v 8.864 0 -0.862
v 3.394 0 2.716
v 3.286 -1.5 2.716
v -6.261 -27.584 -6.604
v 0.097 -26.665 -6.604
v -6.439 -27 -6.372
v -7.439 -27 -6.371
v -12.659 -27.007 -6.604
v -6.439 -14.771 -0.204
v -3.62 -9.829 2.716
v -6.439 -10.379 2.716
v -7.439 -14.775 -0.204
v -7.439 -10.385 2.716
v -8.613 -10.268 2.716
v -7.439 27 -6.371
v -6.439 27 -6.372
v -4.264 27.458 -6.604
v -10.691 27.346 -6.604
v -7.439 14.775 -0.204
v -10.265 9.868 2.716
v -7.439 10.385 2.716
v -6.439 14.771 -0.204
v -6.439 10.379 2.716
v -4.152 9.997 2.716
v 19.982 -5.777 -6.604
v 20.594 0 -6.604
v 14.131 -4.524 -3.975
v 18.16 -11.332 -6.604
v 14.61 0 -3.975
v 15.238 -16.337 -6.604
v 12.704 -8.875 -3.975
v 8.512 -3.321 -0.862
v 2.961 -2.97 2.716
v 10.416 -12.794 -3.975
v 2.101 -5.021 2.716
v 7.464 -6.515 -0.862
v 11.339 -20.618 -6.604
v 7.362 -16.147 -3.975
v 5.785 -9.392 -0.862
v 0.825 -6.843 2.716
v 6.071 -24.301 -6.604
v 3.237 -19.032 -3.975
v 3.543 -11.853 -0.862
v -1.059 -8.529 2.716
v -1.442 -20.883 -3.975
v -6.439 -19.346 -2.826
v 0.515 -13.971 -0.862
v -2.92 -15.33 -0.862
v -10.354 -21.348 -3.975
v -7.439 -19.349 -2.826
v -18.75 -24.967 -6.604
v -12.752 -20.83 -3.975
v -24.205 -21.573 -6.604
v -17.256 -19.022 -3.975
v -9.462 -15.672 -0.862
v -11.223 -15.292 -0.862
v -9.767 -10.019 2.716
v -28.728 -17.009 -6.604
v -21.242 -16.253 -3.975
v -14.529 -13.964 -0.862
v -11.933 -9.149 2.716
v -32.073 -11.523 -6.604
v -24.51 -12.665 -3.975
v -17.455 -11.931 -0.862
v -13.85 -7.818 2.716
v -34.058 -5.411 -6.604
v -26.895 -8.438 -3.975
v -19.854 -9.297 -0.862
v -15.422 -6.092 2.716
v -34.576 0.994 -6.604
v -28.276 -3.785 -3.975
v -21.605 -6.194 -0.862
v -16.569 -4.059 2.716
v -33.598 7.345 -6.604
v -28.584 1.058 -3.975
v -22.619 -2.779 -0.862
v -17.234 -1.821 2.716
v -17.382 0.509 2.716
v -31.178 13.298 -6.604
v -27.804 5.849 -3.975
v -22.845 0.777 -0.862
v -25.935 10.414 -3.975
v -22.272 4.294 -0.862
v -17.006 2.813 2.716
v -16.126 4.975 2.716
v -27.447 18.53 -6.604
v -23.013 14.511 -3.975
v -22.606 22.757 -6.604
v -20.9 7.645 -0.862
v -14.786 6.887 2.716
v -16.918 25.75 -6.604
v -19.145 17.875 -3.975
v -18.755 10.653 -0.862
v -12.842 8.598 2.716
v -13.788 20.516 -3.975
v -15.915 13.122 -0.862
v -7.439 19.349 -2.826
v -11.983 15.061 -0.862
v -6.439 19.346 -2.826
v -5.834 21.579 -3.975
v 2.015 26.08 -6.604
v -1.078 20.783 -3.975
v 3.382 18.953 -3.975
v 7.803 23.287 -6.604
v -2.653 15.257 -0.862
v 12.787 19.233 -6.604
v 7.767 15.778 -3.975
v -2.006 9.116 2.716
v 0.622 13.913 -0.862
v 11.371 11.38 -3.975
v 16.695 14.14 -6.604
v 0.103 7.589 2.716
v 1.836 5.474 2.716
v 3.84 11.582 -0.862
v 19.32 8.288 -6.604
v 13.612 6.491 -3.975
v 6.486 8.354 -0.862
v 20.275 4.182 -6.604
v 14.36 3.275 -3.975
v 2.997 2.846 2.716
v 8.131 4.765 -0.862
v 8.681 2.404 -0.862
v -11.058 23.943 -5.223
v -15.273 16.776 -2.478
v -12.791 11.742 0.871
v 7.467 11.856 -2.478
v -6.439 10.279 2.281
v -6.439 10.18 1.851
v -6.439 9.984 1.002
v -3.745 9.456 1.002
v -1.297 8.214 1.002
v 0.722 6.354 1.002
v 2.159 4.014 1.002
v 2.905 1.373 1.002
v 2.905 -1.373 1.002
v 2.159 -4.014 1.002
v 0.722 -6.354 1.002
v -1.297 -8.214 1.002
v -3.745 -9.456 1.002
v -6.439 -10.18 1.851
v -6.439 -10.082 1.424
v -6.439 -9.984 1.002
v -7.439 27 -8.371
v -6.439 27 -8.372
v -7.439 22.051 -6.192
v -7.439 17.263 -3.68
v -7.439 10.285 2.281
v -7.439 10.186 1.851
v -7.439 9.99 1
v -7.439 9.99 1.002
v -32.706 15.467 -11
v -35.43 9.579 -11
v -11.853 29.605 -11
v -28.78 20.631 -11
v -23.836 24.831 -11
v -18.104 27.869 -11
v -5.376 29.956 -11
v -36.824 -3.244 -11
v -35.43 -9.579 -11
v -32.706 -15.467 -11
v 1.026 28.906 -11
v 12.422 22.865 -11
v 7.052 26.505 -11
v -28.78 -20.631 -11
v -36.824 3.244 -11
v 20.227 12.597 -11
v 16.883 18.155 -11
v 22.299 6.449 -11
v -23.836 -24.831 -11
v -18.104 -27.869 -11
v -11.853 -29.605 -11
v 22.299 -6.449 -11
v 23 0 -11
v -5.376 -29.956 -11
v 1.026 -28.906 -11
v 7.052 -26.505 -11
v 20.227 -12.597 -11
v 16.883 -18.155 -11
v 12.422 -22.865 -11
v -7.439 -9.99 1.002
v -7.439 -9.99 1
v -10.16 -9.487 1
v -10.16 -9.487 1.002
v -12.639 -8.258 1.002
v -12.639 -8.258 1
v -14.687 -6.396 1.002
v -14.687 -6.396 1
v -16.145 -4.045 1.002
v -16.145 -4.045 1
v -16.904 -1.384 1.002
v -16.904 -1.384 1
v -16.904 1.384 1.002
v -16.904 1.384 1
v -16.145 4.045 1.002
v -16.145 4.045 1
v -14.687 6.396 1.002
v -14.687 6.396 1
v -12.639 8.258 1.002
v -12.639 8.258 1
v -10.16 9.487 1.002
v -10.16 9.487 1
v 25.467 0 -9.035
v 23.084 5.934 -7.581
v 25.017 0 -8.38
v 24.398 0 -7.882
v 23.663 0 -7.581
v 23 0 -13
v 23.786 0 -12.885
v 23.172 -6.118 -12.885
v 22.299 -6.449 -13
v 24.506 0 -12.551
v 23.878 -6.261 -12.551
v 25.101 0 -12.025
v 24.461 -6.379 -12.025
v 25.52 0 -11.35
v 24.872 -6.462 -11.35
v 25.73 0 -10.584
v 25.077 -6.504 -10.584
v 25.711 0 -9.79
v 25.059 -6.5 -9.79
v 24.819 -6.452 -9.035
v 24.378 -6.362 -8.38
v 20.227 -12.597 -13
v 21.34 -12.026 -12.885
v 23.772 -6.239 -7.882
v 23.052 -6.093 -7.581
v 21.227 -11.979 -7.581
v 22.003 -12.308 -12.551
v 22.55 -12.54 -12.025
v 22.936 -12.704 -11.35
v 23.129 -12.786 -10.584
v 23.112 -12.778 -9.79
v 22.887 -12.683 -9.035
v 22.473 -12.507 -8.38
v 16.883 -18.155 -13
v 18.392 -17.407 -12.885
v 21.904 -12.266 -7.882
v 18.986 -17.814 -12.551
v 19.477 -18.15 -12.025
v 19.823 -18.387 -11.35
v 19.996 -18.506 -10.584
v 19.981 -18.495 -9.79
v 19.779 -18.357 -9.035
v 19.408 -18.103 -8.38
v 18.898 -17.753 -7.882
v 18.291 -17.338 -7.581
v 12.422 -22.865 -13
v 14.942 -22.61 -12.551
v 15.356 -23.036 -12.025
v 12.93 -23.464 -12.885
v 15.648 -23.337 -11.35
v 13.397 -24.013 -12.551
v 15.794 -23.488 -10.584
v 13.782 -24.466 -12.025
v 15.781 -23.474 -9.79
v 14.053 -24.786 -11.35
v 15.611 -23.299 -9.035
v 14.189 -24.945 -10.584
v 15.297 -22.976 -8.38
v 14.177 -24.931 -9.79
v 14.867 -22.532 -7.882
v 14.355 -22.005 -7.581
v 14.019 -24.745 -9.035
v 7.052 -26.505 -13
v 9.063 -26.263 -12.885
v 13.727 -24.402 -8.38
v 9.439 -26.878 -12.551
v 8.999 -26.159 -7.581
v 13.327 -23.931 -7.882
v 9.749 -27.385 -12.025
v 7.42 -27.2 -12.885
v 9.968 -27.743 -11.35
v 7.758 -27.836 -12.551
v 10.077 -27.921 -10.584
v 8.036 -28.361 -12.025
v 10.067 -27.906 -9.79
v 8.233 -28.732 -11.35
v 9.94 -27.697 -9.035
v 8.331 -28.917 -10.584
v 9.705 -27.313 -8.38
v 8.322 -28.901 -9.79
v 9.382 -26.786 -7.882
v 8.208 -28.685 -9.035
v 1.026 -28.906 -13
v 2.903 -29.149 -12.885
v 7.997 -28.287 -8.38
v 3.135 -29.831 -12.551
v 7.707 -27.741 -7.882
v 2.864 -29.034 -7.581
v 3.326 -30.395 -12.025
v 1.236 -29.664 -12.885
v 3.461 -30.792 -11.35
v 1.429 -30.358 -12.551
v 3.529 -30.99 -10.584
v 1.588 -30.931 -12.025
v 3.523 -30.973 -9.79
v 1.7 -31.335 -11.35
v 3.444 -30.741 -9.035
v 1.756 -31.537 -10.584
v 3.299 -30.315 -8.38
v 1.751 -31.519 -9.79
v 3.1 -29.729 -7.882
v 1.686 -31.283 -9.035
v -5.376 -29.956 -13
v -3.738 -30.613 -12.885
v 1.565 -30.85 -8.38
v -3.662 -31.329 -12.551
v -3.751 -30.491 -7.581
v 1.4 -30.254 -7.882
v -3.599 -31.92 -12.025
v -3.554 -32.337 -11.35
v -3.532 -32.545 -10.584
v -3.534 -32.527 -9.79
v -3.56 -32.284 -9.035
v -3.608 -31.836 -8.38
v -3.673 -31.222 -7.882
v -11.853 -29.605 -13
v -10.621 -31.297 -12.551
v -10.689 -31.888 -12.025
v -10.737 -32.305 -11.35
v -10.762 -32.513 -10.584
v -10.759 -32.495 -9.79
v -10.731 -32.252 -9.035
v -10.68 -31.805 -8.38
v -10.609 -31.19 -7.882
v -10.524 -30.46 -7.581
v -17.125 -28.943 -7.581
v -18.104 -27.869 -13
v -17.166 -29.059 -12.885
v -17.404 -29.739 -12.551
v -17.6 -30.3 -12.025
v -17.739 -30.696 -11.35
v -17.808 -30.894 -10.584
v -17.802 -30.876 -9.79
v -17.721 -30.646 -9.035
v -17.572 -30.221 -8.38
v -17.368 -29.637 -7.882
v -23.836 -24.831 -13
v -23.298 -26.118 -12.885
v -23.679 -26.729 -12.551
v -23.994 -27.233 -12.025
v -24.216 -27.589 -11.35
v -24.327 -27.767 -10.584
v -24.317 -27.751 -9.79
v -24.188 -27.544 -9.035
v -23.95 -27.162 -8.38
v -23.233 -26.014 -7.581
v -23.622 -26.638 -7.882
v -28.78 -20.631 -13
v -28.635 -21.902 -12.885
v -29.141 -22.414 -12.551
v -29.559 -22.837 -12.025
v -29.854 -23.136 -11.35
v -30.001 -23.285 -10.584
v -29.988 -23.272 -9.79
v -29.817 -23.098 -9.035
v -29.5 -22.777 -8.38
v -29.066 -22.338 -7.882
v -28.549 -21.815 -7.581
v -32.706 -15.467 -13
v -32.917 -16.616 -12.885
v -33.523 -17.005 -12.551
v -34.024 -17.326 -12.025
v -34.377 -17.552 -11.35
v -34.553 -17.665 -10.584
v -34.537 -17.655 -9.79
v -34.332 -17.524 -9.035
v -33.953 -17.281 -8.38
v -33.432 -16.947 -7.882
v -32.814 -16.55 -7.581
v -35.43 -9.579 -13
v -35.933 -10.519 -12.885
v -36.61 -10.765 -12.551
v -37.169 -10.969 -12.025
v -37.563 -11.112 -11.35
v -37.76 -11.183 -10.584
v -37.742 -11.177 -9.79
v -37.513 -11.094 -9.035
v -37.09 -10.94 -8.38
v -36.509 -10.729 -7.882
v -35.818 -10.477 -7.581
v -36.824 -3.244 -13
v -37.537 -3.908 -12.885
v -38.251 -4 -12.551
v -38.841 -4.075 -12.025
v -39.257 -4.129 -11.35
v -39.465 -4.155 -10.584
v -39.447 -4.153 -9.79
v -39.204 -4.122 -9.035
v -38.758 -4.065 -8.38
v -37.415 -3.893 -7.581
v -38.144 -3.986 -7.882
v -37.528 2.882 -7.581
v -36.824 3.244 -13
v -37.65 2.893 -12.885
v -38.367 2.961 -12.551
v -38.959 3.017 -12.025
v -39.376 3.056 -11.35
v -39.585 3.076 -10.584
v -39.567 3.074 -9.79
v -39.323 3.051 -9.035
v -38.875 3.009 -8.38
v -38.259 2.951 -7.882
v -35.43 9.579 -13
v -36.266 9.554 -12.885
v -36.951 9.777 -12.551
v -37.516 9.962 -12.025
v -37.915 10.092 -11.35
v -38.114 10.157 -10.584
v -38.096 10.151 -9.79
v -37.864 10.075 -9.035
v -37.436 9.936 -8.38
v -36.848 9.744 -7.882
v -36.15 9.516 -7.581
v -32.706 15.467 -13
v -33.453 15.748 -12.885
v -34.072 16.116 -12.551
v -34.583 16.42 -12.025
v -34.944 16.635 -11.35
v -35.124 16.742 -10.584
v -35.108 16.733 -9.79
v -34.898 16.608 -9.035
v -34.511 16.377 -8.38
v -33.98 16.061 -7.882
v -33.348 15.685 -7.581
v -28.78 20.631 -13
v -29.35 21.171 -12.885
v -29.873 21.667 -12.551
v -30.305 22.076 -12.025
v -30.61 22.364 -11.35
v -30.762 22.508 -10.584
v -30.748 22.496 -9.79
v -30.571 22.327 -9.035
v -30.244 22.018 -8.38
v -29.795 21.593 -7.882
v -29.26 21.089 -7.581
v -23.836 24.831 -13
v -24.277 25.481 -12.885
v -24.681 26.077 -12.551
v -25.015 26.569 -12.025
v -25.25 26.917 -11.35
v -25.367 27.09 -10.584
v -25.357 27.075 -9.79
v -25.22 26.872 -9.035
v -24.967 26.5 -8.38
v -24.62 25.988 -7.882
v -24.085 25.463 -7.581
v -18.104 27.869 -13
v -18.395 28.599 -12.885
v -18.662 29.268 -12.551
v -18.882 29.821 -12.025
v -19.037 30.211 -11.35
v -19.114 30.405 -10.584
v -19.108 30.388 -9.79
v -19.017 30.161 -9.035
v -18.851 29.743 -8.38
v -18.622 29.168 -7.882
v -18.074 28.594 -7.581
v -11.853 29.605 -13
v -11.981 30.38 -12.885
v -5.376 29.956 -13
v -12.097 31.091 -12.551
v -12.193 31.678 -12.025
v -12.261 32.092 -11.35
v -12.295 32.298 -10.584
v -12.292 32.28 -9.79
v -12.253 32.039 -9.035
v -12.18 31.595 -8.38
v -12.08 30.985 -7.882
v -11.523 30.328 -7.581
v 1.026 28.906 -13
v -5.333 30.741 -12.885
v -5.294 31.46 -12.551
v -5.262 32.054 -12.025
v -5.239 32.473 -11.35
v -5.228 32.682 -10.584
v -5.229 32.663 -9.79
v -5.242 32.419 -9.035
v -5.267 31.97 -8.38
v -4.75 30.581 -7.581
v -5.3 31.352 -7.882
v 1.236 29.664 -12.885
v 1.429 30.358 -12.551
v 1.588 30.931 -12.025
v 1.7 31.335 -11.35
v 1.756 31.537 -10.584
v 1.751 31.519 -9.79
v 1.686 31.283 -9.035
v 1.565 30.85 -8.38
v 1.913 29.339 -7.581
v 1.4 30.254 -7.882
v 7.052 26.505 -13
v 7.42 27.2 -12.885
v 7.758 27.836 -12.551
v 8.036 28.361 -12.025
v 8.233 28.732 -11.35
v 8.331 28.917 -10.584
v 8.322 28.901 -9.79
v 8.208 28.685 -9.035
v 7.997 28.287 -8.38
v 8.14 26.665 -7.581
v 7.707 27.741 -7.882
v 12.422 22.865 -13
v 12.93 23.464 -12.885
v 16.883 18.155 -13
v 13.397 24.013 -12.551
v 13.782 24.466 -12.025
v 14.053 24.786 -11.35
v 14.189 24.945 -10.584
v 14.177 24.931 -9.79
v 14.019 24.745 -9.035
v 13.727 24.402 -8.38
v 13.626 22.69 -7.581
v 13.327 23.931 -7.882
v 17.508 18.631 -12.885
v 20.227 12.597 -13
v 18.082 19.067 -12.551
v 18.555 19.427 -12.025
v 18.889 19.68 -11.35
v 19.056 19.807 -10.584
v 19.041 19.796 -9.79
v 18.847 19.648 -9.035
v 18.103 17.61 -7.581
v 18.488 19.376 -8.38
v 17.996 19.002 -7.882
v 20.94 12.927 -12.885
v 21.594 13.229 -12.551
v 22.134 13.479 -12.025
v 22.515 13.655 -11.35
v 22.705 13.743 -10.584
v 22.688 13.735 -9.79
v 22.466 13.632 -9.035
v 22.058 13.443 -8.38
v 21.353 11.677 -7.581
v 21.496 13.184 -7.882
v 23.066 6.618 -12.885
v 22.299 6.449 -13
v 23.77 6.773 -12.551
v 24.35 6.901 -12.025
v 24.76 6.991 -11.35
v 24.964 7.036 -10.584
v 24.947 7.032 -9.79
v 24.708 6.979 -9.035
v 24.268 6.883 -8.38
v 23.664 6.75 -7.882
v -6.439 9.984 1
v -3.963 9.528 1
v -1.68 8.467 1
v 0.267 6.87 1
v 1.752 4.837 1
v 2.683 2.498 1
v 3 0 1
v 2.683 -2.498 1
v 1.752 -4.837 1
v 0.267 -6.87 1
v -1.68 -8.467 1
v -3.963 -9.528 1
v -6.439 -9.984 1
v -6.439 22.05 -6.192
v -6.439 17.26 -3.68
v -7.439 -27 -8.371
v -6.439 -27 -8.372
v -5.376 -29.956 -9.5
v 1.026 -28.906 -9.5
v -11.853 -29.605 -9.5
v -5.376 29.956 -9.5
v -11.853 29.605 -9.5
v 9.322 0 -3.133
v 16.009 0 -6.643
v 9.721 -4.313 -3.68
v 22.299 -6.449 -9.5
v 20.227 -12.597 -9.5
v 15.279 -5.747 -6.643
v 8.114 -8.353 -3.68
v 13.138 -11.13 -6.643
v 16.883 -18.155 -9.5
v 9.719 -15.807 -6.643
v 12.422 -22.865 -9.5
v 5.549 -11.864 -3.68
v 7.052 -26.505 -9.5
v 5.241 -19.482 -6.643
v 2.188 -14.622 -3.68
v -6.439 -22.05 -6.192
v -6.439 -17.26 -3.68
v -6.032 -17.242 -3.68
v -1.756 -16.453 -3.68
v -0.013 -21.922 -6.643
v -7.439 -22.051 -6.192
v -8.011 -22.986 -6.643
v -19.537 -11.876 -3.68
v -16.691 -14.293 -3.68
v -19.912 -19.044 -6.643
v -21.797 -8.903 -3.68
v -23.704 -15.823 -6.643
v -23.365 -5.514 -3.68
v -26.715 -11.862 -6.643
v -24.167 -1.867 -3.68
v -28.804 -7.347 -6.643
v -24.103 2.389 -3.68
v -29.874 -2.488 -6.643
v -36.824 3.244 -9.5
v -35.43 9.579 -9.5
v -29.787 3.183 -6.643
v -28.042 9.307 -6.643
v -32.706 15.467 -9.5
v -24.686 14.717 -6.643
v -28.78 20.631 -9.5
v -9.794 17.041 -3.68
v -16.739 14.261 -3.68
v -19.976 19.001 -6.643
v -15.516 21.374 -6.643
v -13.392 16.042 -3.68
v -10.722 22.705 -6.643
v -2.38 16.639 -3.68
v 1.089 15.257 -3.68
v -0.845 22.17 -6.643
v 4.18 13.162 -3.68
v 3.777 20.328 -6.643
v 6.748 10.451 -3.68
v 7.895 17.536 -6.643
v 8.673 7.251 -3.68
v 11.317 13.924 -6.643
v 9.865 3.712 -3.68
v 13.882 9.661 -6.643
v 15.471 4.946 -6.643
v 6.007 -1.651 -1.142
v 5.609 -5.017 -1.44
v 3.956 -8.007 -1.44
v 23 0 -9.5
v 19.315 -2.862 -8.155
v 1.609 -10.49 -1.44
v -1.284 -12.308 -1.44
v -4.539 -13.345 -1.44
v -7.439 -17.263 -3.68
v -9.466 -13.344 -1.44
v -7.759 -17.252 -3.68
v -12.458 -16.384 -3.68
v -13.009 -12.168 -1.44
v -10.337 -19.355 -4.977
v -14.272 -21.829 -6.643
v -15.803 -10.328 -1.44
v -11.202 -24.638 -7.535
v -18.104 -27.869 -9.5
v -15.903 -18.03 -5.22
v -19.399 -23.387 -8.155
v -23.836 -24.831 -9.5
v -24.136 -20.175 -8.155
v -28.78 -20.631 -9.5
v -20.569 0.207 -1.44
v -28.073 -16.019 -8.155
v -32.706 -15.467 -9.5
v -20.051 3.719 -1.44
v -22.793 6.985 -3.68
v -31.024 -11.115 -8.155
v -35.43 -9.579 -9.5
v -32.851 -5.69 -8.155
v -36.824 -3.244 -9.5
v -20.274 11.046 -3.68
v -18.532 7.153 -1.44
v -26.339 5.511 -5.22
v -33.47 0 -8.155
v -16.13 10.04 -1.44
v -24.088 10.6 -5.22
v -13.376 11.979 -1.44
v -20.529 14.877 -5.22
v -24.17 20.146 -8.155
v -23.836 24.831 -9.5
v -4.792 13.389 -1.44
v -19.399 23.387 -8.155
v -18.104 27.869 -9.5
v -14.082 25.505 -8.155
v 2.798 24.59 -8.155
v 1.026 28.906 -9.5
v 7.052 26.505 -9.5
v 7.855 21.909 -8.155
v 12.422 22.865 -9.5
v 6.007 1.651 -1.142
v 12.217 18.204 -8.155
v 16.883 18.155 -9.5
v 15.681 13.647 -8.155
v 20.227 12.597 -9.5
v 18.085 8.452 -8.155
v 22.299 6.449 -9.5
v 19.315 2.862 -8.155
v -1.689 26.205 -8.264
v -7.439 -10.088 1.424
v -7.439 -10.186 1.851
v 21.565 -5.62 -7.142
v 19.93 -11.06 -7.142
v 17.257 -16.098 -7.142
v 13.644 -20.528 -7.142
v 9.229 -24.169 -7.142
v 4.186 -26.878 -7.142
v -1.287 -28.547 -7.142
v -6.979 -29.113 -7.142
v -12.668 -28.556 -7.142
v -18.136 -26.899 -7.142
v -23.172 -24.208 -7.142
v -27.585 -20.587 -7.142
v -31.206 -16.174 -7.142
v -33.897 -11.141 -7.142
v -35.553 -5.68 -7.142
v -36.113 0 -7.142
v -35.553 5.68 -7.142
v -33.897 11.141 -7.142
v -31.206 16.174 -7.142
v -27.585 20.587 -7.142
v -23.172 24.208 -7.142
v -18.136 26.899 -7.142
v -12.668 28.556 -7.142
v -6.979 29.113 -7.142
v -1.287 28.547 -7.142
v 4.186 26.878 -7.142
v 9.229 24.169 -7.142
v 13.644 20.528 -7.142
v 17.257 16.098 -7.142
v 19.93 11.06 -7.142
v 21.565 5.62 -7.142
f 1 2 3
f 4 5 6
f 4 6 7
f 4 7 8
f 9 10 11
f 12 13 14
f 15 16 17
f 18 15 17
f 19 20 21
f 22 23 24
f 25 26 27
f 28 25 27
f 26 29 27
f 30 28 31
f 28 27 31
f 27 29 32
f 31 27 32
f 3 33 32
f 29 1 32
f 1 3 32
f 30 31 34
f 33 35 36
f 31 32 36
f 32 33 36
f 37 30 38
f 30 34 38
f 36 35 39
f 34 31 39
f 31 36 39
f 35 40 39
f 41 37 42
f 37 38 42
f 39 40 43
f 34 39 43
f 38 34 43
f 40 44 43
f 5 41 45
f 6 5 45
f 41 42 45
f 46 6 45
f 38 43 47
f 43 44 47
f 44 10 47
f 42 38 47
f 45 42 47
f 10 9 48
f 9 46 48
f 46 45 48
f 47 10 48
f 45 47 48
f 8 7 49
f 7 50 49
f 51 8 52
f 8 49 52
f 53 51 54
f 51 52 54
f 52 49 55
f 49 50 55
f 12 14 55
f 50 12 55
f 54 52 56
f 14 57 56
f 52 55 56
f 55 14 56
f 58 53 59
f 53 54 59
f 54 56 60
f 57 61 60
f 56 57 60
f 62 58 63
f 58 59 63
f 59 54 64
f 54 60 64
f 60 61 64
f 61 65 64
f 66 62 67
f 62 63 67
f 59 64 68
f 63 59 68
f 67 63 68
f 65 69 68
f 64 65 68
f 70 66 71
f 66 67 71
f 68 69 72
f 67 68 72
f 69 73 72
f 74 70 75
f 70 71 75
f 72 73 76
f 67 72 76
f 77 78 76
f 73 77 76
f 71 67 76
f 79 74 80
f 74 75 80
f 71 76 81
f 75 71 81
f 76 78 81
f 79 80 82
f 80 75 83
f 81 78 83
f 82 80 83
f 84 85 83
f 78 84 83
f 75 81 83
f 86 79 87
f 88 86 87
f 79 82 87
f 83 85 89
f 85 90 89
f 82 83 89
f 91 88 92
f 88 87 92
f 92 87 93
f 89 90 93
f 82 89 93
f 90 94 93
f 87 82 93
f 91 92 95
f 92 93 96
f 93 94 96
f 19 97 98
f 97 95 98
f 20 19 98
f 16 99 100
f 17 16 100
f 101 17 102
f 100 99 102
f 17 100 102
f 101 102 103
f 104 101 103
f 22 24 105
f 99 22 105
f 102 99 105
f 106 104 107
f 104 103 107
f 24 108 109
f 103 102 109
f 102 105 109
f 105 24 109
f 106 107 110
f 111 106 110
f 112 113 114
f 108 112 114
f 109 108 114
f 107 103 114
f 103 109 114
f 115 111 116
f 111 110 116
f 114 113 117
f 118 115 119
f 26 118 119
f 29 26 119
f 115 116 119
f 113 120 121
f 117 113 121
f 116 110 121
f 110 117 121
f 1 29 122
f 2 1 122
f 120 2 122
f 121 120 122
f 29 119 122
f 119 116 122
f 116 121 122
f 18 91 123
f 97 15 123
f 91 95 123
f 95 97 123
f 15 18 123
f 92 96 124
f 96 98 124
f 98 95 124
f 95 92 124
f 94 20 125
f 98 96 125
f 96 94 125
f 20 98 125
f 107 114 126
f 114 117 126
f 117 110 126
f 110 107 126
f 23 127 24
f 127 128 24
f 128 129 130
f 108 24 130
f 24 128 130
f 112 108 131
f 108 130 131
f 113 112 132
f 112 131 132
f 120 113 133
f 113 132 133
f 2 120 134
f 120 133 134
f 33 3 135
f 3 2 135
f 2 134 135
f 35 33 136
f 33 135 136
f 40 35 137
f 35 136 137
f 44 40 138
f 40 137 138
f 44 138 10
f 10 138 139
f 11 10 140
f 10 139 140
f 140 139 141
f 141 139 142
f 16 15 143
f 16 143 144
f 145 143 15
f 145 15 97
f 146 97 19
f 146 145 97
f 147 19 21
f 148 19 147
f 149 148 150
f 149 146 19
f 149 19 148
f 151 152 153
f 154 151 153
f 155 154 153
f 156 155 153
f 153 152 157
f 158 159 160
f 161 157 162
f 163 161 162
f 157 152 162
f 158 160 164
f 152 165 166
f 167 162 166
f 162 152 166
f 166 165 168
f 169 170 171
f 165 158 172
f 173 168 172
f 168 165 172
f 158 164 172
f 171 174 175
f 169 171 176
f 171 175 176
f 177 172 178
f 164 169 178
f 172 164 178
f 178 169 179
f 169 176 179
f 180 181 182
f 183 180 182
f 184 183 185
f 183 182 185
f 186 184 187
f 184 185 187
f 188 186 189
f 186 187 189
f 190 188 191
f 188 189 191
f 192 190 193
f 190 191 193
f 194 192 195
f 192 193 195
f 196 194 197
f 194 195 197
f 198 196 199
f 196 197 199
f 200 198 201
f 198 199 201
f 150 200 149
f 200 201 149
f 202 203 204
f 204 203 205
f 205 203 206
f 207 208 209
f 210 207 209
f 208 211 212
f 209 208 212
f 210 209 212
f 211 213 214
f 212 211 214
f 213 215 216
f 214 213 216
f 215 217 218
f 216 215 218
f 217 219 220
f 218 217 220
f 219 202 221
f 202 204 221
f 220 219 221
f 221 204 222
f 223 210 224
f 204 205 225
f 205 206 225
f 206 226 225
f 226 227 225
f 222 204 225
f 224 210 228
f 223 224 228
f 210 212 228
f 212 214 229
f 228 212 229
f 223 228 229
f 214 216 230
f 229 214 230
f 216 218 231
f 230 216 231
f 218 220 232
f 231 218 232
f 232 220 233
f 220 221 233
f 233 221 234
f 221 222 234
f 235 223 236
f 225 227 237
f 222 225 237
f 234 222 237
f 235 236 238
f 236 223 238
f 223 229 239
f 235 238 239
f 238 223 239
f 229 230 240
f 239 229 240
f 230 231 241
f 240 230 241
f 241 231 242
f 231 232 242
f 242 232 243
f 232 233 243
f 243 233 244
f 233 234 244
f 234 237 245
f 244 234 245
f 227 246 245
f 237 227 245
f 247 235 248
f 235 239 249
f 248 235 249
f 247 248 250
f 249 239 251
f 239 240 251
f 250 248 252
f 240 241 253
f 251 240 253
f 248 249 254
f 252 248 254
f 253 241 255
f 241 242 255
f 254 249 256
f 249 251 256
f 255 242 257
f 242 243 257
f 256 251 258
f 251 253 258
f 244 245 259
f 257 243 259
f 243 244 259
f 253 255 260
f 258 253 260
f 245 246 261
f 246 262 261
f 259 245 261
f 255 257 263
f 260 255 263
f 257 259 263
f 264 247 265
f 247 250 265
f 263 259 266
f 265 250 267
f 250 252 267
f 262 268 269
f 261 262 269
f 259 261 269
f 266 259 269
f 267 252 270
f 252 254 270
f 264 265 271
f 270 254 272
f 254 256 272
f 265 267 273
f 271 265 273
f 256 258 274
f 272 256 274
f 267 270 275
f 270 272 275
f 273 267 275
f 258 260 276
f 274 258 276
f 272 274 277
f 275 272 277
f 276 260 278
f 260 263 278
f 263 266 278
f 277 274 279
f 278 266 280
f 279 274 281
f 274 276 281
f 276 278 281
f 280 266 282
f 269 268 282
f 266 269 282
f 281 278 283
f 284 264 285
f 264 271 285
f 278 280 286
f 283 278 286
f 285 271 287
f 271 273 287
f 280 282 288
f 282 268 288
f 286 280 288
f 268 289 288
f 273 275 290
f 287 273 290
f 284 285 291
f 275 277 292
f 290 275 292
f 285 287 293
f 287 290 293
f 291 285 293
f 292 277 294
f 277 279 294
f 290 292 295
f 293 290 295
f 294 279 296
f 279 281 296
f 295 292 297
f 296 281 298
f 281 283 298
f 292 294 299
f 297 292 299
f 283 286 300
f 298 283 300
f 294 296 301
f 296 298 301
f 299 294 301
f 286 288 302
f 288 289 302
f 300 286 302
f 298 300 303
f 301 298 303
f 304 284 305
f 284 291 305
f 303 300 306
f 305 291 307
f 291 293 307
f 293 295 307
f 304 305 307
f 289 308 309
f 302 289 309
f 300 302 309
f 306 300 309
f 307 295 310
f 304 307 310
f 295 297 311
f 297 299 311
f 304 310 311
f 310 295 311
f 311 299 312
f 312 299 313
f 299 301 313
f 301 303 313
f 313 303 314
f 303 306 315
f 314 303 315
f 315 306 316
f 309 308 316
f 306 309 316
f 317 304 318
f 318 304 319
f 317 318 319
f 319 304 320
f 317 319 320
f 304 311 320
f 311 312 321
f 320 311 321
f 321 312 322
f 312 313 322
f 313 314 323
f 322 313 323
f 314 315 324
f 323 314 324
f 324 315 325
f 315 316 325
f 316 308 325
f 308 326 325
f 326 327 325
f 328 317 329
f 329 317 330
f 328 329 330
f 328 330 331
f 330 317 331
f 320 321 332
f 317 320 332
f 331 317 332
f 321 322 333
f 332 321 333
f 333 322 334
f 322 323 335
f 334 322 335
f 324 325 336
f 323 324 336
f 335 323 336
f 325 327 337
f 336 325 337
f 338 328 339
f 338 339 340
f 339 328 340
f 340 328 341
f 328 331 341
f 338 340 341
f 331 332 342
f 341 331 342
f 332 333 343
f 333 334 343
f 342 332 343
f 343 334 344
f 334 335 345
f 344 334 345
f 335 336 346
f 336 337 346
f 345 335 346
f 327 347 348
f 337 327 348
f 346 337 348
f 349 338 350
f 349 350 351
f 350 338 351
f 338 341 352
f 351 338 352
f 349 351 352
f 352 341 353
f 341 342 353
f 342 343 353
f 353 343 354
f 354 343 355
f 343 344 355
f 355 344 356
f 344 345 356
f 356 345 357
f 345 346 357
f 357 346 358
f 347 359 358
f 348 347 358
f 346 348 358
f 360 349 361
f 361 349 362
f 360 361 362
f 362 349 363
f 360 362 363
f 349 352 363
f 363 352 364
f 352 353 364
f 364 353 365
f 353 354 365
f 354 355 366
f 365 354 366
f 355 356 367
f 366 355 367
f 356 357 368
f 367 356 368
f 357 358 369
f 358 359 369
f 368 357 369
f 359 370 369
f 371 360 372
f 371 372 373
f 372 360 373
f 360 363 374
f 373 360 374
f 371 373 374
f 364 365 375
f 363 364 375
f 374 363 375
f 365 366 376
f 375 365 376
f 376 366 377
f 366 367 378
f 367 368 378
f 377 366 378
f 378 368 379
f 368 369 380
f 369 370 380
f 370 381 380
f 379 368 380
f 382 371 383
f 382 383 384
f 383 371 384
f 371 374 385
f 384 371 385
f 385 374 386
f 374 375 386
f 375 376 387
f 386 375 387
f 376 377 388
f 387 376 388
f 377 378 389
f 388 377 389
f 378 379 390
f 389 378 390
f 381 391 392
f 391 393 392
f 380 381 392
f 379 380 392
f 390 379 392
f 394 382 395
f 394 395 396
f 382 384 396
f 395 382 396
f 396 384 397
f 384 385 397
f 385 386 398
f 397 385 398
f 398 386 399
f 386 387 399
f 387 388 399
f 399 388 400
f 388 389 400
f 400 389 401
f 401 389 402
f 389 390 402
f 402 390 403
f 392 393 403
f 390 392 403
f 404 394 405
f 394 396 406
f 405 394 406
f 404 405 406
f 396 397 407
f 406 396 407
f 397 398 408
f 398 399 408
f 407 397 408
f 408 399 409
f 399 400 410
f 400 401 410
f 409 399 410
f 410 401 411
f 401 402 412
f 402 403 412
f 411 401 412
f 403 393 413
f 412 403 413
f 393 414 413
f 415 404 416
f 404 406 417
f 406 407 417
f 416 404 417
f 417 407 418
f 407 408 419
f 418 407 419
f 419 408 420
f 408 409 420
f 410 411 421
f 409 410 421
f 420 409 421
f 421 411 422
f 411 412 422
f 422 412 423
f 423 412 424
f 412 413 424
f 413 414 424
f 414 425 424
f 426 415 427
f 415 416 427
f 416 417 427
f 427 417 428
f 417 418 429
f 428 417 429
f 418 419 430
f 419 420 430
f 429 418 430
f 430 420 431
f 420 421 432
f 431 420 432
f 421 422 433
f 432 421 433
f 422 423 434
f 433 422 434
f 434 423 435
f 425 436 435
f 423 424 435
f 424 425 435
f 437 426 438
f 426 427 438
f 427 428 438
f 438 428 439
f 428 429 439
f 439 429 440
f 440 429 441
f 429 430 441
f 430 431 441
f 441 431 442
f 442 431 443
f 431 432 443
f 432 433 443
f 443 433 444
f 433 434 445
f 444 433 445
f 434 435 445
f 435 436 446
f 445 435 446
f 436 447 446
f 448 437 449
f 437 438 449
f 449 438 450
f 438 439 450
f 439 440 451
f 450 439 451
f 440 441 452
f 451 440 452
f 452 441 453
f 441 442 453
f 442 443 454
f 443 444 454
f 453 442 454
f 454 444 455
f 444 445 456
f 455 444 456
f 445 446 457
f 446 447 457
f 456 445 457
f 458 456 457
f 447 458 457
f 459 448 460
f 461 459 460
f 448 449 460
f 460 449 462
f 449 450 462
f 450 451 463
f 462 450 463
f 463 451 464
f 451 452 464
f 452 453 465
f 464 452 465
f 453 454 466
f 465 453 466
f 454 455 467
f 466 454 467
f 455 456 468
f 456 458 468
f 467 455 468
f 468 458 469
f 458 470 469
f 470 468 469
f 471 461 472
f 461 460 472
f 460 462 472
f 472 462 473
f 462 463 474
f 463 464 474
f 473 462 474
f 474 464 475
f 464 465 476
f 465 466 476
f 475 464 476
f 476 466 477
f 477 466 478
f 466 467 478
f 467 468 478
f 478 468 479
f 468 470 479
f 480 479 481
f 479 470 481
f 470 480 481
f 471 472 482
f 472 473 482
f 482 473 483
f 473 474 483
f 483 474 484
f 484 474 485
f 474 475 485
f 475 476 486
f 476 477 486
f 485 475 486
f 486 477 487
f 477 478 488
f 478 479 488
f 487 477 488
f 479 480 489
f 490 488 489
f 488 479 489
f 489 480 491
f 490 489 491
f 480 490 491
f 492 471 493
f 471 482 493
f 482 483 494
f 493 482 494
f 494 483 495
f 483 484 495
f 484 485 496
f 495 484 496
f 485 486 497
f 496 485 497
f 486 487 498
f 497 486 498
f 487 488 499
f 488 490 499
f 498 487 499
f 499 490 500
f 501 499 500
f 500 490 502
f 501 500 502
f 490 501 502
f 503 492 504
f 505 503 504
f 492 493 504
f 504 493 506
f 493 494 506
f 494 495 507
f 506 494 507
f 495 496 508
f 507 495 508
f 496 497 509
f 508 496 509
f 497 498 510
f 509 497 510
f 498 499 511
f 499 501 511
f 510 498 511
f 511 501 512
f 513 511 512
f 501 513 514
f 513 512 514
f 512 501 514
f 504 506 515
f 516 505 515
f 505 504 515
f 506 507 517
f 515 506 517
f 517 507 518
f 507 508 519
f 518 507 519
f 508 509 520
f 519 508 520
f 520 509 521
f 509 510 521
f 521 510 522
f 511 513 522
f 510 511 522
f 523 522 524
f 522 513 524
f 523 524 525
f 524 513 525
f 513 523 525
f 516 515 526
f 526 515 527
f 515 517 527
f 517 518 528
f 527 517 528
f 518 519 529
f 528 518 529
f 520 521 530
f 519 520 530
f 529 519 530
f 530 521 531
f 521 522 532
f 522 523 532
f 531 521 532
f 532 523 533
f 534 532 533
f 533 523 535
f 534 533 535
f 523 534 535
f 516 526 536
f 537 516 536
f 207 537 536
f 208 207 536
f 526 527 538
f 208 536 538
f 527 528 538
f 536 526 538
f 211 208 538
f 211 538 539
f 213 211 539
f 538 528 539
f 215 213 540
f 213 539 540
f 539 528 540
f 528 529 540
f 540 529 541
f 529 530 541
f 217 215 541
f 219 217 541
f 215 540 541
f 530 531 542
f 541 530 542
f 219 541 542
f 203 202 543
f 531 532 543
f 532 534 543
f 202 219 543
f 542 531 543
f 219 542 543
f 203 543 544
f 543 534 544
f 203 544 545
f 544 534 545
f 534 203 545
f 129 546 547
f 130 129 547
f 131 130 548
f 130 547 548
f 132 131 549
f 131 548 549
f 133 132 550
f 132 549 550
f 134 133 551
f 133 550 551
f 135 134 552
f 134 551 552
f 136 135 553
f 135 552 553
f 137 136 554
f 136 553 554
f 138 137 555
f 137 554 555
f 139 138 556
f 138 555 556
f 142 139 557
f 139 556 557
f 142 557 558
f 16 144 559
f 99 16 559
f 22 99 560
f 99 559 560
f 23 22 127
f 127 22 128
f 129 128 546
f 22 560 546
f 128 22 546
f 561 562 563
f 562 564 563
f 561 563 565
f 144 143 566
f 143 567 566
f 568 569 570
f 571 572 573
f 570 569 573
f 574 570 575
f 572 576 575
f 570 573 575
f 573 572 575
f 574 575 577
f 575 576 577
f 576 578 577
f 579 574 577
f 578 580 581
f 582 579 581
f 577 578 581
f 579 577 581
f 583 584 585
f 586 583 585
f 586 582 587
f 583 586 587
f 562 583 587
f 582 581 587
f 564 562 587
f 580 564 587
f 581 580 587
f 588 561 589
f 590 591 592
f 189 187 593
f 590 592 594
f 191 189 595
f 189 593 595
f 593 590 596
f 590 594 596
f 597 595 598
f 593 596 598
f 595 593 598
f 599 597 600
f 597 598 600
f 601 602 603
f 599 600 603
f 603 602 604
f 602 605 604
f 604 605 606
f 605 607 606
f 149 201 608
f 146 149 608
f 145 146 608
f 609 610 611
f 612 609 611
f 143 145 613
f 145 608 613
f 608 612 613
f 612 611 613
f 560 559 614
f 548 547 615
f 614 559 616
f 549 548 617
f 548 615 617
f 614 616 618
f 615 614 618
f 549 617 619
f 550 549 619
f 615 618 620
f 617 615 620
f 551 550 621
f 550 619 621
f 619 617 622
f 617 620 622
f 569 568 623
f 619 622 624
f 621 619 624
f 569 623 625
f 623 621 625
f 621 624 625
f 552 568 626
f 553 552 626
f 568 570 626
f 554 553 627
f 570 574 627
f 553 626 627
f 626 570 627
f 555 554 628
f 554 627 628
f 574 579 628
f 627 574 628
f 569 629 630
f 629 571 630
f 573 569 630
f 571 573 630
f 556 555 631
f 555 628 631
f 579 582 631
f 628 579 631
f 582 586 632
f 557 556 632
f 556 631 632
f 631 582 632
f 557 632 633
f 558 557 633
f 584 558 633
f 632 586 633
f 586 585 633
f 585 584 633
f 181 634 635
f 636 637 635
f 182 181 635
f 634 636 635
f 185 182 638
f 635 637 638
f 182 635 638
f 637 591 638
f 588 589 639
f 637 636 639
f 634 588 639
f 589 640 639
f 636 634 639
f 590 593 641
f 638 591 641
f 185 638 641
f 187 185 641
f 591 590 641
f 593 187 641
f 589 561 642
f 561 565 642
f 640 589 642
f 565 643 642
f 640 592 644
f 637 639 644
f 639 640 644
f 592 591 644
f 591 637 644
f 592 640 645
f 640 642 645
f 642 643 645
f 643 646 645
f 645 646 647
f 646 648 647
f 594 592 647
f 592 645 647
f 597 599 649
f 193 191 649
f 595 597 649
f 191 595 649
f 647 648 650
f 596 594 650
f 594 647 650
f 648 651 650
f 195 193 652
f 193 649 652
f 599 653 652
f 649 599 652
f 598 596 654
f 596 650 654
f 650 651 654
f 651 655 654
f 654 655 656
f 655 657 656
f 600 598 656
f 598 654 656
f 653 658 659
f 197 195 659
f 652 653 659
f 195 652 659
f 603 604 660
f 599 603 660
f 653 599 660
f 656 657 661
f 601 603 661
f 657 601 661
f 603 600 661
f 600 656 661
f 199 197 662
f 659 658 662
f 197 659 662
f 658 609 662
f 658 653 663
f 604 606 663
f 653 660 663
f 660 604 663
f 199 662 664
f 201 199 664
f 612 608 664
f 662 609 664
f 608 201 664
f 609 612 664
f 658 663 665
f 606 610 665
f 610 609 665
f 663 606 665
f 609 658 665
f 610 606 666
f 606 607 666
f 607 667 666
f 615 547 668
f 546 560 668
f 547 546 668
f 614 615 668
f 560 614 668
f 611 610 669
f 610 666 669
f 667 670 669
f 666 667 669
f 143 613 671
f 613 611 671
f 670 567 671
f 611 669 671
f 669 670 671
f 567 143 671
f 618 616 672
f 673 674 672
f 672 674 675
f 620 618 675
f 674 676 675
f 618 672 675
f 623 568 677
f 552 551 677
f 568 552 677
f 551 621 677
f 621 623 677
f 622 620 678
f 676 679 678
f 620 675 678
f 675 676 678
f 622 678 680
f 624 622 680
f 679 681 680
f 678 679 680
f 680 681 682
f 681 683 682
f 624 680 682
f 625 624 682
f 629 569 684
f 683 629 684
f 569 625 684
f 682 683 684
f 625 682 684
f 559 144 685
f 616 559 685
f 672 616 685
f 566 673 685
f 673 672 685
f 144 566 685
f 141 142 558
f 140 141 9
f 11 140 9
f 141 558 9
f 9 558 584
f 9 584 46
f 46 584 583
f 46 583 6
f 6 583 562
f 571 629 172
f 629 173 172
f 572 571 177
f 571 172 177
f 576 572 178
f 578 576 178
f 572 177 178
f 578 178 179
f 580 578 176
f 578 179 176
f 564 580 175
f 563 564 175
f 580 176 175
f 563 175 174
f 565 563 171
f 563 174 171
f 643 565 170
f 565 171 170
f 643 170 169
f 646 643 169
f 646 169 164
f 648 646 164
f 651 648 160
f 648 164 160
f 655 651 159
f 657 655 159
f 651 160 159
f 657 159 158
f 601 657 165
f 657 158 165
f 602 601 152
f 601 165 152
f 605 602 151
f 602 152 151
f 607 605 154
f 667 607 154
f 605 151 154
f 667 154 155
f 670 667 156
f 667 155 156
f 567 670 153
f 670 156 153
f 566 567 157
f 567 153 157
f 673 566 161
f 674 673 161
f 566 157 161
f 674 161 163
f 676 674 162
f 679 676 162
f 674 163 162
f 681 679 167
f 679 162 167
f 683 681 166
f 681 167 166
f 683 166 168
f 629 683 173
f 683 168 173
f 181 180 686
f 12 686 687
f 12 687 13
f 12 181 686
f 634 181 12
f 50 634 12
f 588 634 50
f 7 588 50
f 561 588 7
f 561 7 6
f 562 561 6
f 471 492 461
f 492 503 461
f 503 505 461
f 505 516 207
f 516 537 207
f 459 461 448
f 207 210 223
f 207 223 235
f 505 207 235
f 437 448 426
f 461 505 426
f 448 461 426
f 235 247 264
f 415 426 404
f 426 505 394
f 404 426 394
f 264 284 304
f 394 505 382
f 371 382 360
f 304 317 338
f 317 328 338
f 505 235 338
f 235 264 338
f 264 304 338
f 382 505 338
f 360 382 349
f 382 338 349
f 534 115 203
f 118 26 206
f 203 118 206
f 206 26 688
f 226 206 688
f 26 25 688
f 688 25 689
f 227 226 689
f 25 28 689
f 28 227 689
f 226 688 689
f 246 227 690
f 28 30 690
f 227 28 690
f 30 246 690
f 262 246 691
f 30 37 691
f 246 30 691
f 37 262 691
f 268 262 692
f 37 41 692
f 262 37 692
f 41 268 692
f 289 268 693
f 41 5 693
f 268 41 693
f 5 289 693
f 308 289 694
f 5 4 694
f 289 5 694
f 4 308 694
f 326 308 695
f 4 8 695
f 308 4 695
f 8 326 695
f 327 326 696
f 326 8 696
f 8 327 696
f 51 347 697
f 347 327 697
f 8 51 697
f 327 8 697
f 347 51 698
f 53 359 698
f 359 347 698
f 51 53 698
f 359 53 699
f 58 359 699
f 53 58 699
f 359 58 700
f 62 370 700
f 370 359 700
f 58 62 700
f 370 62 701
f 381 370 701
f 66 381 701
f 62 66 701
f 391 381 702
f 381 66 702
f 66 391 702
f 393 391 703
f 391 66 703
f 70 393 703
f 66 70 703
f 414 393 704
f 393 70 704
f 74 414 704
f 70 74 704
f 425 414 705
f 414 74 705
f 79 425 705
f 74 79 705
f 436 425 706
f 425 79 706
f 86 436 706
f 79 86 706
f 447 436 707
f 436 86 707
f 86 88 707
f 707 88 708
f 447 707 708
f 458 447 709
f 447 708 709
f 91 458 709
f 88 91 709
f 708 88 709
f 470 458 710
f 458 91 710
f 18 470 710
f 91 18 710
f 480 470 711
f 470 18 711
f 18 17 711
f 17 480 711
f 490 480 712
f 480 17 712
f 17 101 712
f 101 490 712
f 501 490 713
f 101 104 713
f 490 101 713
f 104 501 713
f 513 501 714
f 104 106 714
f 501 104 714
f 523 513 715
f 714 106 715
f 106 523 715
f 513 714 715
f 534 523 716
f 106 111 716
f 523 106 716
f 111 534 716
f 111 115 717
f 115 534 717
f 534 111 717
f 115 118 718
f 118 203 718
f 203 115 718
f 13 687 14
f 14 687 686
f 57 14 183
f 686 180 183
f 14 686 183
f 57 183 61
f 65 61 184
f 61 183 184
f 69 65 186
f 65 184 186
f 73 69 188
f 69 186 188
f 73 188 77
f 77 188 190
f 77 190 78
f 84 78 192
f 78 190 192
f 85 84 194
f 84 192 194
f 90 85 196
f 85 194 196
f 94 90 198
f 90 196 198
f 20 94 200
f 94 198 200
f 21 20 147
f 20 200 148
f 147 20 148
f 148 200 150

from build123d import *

# Parameters (mm, degrees)
F3_R     = 25
F5_START = -2.7
F4_W     = 1
F4_H     = 53.9998769996
F5_DEPTH = 22.3


# Not quite as in the source:
# - a fillet or chamfer that OpenCascade refuses, or shapes differently, is made with other operations: its cross-section is extruded or revolved along the edge and cut away or added


with BuildPart() as f1:
    # F0 (on Front) → F1 (revolve)
    with BuildSketch(Plane.XZ):
        with BuildLine():
            ThreePointArc((3, 1), (12.6231681205, -4.9677750086), (23, -9.5))
            Line((23, -9.5), (23, -11))
            Line((23, -11), (-7, -11))
            Line((-7, -11), (-7, -13))
            Line((-7, -13), (23, -13))
            ThreePointArc((23, -13), (25.75, -10.25), (23, -7.5))
            ThreePointArc((23, -7.5), (12.6231681205, -2.9677750086), (3, 3))
            Line((3, 3), (3, 1))
        make_face()
    revolve(axis=Axis((-7, 0, -1.698827371), (0, 0, -1)))

    # F2: chamfer of 0.5 x 2 on 1 edges, made by hand

    # F2_s1 → F2_t2 (revolve, cut)
    with BuildSketch(Plane.XZ):
        with BuildLine():
            Line((3.4123952329, 2.7941574241), (2.9820609835, 0.9239297508))
            Line((2.9820609835, 0.9239297508), (2.9420609835, 0.9239297508))
            ThreePointArc((2.9420609835, 0.9239297508), (2.96, 1.9619648754), (2.96, 3))
            Line((2.96, 3), (3.0234608243, 3.0323973722))
            ThreePointArc((3.0234608243, 3.0323973722), (3.2078025867, 2.8993085114), (3.4356565384, 2.8266983471))
            Line((3.4356565384, 2.8266983471), (3.4123952329, 2.7941574241))
        make_face()
    revolve(axis=Axis((-7, 0, 3), (0, 0, -1)), mode=Mode.SUBTRACT)

    # F3
    f3_edges = [f1.edges().sort_by_distance(p)[0] for p in [
        (-37, 0, -7.5),
    ]]
    fillet(f3_edges, radius=F3_R)

    # F4 (on face) → F5 (cut)
    with BuildSketch(Plane(origin=(0, 0, -13), x_dir=(1, 0, 0), z_dir=(0, 0, -1)).offset(F5_START)):
        with Locations((-6.9392545743, 0)):
            Rectangle(F4_W, F4_H)
    extrude(amount=-F5_DEPTH, mode=Mode.SUBTRACT)


solid = f1.part
